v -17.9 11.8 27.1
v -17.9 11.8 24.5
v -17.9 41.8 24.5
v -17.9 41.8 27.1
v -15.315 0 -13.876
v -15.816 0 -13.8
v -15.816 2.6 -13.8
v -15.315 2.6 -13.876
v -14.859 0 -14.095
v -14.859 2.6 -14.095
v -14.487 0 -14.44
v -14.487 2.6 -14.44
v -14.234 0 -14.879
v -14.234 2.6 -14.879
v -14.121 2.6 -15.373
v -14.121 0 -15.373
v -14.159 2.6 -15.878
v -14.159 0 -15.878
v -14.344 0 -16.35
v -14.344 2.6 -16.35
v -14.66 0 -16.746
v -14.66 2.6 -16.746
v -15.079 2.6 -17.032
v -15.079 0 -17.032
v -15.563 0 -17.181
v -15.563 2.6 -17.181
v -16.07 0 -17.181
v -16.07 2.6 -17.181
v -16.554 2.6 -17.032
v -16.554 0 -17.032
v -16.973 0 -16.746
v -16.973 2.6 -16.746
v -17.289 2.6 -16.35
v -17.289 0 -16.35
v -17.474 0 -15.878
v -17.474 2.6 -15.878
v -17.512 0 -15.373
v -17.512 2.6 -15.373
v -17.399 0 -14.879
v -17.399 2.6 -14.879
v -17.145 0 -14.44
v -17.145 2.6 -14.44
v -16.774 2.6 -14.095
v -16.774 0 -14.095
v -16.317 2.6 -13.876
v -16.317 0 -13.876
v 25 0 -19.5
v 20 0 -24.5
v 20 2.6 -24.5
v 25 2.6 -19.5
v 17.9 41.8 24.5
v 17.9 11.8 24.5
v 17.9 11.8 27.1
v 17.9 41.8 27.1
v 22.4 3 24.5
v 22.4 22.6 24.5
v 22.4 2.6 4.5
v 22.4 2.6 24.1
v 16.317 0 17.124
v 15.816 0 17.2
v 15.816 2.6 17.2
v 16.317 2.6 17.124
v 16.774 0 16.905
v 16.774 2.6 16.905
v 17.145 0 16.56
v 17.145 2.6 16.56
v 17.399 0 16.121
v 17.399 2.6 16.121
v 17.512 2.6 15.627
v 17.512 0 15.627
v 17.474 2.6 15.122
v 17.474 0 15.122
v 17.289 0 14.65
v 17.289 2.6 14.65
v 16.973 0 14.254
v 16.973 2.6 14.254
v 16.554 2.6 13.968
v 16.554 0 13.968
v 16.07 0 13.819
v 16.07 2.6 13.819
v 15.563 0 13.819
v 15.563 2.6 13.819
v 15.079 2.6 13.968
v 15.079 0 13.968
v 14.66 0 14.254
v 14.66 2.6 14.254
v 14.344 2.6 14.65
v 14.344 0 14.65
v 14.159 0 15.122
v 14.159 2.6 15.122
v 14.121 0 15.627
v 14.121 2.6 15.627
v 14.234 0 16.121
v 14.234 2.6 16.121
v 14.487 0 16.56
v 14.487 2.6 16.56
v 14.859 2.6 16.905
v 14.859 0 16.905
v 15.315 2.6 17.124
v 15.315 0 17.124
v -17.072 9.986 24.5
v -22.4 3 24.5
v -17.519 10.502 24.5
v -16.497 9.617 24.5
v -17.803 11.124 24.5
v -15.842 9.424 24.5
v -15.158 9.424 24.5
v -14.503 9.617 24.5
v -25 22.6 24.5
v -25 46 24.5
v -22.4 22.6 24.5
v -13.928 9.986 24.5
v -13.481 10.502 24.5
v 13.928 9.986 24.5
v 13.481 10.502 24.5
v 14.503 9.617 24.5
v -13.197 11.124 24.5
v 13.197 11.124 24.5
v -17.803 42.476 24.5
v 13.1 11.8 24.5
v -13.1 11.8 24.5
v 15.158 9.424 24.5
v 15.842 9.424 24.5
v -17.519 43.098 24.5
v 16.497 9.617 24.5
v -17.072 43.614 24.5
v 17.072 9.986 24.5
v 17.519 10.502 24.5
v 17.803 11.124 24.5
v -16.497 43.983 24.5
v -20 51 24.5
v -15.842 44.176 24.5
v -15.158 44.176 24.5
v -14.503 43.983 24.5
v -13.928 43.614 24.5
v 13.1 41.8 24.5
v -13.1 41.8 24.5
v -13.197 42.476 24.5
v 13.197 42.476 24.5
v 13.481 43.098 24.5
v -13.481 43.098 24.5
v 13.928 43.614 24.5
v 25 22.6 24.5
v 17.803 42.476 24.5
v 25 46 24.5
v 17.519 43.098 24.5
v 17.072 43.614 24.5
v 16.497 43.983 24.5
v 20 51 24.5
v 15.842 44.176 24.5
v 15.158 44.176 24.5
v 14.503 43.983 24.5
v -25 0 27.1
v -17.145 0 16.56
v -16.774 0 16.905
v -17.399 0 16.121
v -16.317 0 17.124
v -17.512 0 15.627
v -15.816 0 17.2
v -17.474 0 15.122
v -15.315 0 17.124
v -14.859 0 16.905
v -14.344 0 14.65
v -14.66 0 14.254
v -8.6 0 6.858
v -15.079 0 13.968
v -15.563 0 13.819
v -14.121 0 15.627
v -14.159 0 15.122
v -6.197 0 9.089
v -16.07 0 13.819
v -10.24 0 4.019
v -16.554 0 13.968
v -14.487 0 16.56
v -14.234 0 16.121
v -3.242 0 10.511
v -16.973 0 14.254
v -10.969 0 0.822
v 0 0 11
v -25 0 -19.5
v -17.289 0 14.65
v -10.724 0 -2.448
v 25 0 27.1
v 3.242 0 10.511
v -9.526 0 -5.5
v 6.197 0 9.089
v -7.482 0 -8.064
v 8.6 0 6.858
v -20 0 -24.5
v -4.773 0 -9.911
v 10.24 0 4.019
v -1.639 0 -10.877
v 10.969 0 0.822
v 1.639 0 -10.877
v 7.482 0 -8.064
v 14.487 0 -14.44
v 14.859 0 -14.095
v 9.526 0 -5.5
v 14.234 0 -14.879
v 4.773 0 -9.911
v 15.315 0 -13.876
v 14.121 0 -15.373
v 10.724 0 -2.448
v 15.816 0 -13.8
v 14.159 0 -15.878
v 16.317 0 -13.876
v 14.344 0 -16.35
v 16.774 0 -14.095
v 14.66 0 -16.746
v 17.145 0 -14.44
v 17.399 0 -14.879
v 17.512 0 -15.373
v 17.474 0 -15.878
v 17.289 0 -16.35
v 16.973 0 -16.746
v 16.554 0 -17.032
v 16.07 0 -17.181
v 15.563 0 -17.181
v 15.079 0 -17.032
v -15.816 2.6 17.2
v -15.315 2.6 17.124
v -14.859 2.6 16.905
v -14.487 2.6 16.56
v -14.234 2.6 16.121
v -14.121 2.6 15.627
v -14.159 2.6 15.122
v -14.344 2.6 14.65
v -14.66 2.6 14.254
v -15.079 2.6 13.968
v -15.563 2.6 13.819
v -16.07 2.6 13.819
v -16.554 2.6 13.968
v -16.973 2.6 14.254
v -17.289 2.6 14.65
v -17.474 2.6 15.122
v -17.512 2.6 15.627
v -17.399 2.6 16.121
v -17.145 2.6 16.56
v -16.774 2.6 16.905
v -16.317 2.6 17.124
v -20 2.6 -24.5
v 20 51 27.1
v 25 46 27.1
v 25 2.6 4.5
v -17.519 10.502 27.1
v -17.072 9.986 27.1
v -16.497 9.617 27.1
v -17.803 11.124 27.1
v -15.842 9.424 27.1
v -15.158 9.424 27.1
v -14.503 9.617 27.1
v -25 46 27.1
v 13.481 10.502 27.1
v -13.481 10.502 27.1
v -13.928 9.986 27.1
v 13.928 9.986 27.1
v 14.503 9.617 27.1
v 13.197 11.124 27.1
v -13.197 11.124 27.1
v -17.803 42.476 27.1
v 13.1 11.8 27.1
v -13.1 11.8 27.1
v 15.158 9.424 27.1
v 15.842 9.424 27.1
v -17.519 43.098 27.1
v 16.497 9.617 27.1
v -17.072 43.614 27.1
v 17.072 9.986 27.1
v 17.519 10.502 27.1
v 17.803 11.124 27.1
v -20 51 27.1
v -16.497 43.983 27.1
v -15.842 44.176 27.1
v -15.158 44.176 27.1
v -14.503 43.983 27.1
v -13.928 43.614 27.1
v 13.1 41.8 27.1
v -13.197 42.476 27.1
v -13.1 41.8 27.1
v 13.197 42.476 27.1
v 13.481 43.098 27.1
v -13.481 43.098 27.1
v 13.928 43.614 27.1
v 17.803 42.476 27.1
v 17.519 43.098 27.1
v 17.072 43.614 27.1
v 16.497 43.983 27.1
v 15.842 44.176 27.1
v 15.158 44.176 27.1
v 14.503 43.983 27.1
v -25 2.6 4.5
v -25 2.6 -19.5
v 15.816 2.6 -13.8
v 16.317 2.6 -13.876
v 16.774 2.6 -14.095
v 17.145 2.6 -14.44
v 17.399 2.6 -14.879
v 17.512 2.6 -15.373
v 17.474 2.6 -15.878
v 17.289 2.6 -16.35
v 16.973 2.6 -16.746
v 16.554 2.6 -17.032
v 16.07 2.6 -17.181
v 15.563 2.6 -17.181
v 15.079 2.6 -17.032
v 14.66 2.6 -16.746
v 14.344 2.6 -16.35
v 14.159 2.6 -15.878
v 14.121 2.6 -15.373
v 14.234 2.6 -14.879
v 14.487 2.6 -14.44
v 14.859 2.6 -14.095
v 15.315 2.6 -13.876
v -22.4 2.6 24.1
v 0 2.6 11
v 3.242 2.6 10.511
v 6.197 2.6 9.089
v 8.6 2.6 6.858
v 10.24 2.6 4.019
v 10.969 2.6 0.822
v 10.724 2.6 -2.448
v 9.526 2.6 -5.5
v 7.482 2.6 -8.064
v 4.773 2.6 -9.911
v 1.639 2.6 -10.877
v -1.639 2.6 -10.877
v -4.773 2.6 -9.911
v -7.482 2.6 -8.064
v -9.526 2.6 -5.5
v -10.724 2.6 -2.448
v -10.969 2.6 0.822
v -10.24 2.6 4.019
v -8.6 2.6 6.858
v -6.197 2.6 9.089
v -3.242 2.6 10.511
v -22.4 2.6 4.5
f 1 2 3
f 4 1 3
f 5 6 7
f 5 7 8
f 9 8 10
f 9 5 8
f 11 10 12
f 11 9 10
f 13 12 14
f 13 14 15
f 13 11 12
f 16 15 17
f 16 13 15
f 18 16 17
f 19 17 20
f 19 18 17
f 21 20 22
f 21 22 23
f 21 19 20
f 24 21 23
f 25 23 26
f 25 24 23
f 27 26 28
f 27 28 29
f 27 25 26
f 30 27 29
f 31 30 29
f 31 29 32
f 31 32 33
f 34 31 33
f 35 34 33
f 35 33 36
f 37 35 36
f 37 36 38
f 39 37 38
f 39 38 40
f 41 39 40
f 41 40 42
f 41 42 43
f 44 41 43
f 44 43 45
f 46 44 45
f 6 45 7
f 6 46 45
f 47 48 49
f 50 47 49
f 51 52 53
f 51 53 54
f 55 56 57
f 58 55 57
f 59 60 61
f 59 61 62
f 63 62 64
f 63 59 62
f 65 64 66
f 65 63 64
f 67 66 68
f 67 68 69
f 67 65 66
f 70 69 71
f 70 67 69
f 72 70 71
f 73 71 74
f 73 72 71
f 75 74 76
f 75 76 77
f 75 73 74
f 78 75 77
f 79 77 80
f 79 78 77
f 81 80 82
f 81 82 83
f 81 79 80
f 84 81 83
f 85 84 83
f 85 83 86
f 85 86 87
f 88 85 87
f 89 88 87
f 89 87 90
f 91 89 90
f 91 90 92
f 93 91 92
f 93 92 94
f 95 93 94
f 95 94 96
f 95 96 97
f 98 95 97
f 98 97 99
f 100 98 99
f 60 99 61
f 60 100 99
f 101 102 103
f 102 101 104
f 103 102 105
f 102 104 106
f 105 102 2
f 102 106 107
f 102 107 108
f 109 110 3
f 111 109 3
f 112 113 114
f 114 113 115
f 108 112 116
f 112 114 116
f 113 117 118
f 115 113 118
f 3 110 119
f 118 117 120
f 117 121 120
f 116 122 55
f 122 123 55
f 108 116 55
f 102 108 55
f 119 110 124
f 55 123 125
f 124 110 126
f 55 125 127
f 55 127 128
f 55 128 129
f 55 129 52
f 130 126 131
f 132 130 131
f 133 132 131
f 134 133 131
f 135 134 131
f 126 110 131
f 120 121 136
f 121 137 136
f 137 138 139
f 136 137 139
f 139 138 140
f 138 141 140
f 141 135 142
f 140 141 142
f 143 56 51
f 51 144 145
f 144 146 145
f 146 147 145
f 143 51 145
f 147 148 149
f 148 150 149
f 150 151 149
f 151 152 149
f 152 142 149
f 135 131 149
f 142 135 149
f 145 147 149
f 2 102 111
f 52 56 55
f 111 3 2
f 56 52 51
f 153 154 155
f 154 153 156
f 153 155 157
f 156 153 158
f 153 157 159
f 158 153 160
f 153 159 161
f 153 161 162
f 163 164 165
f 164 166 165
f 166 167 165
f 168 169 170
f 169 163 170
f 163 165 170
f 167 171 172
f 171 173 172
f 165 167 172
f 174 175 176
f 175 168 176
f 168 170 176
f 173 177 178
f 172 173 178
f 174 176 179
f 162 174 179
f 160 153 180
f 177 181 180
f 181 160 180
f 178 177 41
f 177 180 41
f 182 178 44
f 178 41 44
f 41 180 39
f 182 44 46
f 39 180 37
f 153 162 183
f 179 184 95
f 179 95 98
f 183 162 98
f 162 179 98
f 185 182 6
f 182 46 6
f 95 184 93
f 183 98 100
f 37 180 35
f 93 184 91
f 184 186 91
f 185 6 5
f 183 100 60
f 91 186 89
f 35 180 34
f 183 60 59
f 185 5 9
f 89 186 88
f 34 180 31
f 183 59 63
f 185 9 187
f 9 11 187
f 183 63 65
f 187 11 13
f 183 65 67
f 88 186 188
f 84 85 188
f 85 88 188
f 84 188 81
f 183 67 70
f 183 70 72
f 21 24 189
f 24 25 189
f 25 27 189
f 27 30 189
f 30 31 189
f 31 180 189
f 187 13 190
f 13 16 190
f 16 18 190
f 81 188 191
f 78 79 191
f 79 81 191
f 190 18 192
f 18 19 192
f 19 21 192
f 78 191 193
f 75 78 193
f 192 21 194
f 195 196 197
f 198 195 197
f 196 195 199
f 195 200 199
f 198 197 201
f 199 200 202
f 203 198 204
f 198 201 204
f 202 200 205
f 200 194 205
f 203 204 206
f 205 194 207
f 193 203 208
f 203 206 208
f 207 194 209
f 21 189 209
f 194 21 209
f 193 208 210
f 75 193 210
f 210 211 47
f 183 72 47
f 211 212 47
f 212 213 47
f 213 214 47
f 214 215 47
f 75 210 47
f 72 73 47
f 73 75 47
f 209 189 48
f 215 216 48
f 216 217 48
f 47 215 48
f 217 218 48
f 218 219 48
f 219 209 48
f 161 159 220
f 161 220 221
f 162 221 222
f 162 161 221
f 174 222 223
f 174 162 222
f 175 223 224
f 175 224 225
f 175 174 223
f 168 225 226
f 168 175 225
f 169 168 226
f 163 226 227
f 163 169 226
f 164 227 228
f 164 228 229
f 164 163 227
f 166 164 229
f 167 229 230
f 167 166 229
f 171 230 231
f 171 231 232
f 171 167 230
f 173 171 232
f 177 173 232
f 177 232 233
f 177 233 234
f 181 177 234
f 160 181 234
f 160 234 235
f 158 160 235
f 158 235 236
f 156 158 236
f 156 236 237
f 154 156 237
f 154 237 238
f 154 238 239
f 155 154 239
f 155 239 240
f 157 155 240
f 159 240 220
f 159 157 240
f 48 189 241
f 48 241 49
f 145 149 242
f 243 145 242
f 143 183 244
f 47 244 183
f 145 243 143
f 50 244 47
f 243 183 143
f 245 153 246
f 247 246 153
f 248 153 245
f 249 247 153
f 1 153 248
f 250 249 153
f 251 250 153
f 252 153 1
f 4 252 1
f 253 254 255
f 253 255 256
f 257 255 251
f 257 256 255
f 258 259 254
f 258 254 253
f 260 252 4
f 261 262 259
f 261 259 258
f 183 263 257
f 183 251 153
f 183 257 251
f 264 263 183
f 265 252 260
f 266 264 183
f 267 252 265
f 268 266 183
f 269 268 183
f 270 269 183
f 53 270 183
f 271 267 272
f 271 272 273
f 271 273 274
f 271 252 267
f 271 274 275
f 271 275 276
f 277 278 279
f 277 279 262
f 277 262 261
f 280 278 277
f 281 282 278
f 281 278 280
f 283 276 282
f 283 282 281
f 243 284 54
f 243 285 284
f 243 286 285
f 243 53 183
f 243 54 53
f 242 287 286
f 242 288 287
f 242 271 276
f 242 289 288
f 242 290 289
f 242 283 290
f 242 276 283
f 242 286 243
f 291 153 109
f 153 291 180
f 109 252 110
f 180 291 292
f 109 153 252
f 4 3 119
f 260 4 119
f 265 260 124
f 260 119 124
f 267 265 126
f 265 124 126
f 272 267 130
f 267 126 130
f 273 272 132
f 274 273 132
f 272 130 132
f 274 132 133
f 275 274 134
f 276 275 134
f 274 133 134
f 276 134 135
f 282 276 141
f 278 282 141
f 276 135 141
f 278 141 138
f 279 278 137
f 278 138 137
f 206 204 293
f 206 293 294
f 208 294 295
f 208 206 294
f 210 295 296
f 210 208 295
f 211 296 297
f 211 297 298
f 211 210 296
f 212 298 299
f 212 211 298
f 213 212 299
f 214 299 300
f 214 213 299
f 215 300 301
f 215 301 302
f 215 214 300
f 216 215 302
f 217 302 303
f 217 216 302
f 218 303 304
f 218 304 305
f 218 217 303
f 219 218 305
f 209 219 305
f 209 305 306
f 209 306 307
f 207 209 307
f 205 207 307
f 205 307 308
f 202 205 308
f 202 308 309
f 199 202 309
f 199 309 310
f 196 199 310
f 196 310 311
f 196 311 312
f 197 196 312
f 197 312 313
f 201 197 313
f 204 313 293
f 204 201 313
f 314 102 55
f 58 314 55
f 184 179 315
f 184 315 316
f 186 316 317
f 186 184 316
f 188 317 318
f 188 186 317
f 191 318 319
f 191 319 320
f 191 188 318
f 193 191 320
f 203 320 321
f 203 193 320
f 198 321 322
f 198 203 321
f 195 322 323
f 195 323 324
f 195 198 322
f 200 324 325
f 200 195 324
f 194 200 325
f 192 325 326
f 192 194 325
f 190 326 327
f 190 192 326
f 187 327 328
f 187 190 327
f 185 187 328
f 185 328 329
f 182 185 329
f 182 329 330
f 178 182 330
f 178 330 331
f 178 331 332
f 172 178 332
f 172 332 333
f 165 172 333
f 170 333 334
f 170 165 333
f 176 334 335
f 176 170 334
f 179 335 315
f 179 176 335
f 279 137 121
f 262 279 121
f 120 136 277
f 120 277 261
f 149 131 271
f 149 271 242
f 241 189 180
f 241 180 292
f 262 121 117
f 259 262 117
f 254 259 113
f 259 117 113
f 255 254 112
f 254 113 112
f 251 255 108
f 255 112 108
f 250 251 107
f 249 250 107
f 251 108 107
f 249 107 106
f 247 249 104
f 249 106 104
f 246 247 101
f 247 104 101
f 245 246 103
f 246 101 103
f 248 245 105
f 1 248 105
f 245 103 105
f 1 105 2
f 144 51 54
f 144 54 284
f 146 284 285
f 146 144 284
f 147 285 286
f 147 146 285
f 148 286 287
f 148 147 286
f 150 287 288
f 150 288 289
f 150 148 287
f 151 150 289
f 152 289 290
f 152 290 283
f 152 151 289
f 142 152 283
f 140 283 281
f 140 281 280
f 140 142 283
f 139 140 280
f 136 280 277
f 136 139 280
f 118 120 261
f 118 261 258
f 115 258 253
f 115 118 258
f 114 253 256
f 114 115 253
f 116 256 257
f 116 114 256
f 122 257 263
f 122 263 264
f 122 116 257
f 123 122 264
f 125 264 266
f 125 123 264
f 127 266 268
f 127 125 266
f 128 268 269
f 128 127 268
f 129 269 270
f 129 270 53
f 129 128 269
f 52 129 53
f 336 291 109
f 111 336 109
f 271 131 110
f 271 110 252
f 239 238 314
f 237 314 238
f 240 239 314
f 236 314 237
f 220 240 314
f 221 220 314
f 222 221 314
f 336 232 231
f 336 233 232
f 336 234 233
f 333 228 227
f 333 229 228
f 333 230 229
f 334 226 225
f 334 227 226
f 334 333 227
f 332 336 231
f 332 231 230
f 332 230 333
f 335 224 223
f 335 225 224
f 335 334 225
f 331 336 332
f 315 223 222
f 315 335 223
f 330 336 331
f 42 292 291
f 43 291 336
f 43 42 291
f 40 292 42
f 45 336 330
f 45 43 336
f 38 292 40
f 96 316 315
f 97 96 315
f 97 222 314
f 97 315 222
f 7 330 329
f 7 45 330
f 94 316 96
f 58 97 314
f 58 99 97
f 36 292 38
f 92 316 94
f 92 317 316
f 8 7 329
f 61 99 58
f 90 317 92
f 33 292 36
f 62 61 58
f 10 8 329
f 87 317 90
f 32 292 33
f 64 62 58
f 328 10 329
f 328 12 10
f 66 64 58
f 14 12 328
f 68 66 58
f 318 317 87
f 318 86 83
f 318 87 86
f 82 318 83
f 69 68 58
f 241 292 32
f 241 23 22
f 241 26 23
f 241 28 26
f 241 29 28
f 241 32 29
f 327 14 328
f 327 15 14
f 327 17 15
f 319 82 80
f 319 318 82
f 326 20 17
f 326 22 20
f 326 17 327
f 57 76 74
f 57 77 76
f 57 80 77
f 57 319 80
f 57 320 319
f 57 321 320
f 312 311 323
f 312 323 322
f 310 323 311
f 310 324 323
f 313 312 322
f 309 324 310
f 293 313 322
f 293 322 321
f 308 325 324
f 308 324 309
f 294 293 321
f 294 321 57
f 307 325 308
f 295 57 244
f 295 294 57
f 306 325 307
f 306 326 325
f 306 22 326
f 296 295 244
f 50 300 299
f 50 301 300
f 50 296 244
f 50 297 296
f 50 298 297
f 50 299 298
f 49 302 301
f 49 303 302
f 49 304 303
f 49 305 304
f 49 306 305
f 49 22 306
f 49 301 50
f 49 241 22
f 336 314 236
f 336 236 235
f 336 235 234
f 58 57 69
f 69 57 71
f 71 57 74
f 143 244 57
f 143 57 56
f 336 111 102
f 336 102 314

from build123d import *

# Parameters (mm, degrees)
SKETCH1_W           = 50
SKETCH1_H           = 49
SKETCH1_R           = 1.7
SKETCH1_R_2         = 11
BOSS_EXTRUDE1_DEPTH = 2.6
SKETCH2_W           = 50
SKETCH2_H           = 51
BOSS_EXTRUDE2_DEPTH = 2.6
BOSS_EXTRUDE3_DEPTH = 2.6
CHAMFER1_SIZE       = 5
CHAMFER2_SIZE       = 0.4


with BuildPart() as part:
    # Sketch1 → Boss-Extrude1 (new body)
    with BuildSketch(Plane(origin=(0, 0, 0), x_dir=(1, 0, 0), z_dir=(0, 1, 0))):
        Rectangle(SKETCH1_W, SKETCH1_H)
        with Locations(Location((-15.816326531, 15.5, 0), (0, 0, 270))):
            Circle(SKETCH1_R, mode=Mode.SUBTRACT)
        with Locations(Location((15.816326531, 15.5, 0), (0, 0, 270))):
            Circle(SKETCH1_R, mode=Mode.SUBTRACT)
        with Locations(Location((-15.816326531, -15.5, 0), (0, 0, 270))):
            Circle(SKETCH1_R, mode=Mode.SUBTRACT)
        with Locations(Location((15.816326531, -15.5, 0), (0, 0, 270))):
            Circle(SKETCH1_R, mode=Mode.SUBTRACT)
        with Locations(Location((0, 0, 0), (0, 0, 270))):
            Circle(SKETCH1_R_2, mode=Mode.SUBTRACT)
    extrude(amount=BOSS_EXTRUDE1_DEPTH)

    # Sketch2 → Boss-Extrude2 (add)
    with BuildSketch(Plane.XY.offset(24.5)):
        with Locations((0, 25.5)):
            Rectangle(SKETCH2_W, SKETCH2_H)
        with BuildLine():
            Line((-13.1, 41.8), (-13.1, 11.8))
            ThreePointArc((-13.1, 11.8), (-15.5, 9.4), (-17.9, 11.8))
            Line((-17.9, 11.8), (-17.9, 41.8))
            ThreePointArc((-17.9, 41.8), (-15.5, 44.2), (-13.1, 41.8))
        make_face(mode=Mode.SUBTRACT)
        with BuildLine():
            Line((13.1, 41.8), (13.1, 11.8))
            ThreePointArc((13.1, 11.8), (15.5, 9.4), (17.9, 11.8))
            Line((17.9, 11.8), (17.9, 41.8))
            ThreePointArc((17.9, 41.8), (15.5, 44.2), (13.1, 41.8))
        make_face(mode=Mode.SUBTRACT)
    extrude(amount=BOSS_EXTRUDE2_DEPTH)

    # Sketch3 → Boss-Extrude3 (add)
    with BuildSketch(Plane.ZY.offset(25)):
        Polygon((4.5, 2.6), (24.5, 22.6), (24.5, 2.6), align=None)
    boss_extrude3 = extrude(amount=-BOSS_EXTRUDE3_DEPTH)

    # Mirror1: Boss-Extrude3 across plane
    add(boss_extrude3.mirror(Plane(origin=(0, 0, 0), x_dir=(0, 0, 1), z_dir=(1, 0, 0))))

    # Chamfer1
    chamfer1_edges = [part.edges().sort_by_distance(p)[0] for p in [
        (-25, 51, 25.8),
        (25, 51, 25.8),
        (-25, 1.3, -24.5),
        (25, 1.3, -24.5),
    ]]
    chamfer(chamfer1_edges, length=CHAMFER1_SIZE)

    # Chamfer2
    chamfer2_edges = [part.edges().sort_by_distance(p)[0] for p in [
        (0, 2.6, 24.5),
    ]]
    chamfer(chamfer2_edges, length=CHAMFER2_SIZE)


solid = part.part
